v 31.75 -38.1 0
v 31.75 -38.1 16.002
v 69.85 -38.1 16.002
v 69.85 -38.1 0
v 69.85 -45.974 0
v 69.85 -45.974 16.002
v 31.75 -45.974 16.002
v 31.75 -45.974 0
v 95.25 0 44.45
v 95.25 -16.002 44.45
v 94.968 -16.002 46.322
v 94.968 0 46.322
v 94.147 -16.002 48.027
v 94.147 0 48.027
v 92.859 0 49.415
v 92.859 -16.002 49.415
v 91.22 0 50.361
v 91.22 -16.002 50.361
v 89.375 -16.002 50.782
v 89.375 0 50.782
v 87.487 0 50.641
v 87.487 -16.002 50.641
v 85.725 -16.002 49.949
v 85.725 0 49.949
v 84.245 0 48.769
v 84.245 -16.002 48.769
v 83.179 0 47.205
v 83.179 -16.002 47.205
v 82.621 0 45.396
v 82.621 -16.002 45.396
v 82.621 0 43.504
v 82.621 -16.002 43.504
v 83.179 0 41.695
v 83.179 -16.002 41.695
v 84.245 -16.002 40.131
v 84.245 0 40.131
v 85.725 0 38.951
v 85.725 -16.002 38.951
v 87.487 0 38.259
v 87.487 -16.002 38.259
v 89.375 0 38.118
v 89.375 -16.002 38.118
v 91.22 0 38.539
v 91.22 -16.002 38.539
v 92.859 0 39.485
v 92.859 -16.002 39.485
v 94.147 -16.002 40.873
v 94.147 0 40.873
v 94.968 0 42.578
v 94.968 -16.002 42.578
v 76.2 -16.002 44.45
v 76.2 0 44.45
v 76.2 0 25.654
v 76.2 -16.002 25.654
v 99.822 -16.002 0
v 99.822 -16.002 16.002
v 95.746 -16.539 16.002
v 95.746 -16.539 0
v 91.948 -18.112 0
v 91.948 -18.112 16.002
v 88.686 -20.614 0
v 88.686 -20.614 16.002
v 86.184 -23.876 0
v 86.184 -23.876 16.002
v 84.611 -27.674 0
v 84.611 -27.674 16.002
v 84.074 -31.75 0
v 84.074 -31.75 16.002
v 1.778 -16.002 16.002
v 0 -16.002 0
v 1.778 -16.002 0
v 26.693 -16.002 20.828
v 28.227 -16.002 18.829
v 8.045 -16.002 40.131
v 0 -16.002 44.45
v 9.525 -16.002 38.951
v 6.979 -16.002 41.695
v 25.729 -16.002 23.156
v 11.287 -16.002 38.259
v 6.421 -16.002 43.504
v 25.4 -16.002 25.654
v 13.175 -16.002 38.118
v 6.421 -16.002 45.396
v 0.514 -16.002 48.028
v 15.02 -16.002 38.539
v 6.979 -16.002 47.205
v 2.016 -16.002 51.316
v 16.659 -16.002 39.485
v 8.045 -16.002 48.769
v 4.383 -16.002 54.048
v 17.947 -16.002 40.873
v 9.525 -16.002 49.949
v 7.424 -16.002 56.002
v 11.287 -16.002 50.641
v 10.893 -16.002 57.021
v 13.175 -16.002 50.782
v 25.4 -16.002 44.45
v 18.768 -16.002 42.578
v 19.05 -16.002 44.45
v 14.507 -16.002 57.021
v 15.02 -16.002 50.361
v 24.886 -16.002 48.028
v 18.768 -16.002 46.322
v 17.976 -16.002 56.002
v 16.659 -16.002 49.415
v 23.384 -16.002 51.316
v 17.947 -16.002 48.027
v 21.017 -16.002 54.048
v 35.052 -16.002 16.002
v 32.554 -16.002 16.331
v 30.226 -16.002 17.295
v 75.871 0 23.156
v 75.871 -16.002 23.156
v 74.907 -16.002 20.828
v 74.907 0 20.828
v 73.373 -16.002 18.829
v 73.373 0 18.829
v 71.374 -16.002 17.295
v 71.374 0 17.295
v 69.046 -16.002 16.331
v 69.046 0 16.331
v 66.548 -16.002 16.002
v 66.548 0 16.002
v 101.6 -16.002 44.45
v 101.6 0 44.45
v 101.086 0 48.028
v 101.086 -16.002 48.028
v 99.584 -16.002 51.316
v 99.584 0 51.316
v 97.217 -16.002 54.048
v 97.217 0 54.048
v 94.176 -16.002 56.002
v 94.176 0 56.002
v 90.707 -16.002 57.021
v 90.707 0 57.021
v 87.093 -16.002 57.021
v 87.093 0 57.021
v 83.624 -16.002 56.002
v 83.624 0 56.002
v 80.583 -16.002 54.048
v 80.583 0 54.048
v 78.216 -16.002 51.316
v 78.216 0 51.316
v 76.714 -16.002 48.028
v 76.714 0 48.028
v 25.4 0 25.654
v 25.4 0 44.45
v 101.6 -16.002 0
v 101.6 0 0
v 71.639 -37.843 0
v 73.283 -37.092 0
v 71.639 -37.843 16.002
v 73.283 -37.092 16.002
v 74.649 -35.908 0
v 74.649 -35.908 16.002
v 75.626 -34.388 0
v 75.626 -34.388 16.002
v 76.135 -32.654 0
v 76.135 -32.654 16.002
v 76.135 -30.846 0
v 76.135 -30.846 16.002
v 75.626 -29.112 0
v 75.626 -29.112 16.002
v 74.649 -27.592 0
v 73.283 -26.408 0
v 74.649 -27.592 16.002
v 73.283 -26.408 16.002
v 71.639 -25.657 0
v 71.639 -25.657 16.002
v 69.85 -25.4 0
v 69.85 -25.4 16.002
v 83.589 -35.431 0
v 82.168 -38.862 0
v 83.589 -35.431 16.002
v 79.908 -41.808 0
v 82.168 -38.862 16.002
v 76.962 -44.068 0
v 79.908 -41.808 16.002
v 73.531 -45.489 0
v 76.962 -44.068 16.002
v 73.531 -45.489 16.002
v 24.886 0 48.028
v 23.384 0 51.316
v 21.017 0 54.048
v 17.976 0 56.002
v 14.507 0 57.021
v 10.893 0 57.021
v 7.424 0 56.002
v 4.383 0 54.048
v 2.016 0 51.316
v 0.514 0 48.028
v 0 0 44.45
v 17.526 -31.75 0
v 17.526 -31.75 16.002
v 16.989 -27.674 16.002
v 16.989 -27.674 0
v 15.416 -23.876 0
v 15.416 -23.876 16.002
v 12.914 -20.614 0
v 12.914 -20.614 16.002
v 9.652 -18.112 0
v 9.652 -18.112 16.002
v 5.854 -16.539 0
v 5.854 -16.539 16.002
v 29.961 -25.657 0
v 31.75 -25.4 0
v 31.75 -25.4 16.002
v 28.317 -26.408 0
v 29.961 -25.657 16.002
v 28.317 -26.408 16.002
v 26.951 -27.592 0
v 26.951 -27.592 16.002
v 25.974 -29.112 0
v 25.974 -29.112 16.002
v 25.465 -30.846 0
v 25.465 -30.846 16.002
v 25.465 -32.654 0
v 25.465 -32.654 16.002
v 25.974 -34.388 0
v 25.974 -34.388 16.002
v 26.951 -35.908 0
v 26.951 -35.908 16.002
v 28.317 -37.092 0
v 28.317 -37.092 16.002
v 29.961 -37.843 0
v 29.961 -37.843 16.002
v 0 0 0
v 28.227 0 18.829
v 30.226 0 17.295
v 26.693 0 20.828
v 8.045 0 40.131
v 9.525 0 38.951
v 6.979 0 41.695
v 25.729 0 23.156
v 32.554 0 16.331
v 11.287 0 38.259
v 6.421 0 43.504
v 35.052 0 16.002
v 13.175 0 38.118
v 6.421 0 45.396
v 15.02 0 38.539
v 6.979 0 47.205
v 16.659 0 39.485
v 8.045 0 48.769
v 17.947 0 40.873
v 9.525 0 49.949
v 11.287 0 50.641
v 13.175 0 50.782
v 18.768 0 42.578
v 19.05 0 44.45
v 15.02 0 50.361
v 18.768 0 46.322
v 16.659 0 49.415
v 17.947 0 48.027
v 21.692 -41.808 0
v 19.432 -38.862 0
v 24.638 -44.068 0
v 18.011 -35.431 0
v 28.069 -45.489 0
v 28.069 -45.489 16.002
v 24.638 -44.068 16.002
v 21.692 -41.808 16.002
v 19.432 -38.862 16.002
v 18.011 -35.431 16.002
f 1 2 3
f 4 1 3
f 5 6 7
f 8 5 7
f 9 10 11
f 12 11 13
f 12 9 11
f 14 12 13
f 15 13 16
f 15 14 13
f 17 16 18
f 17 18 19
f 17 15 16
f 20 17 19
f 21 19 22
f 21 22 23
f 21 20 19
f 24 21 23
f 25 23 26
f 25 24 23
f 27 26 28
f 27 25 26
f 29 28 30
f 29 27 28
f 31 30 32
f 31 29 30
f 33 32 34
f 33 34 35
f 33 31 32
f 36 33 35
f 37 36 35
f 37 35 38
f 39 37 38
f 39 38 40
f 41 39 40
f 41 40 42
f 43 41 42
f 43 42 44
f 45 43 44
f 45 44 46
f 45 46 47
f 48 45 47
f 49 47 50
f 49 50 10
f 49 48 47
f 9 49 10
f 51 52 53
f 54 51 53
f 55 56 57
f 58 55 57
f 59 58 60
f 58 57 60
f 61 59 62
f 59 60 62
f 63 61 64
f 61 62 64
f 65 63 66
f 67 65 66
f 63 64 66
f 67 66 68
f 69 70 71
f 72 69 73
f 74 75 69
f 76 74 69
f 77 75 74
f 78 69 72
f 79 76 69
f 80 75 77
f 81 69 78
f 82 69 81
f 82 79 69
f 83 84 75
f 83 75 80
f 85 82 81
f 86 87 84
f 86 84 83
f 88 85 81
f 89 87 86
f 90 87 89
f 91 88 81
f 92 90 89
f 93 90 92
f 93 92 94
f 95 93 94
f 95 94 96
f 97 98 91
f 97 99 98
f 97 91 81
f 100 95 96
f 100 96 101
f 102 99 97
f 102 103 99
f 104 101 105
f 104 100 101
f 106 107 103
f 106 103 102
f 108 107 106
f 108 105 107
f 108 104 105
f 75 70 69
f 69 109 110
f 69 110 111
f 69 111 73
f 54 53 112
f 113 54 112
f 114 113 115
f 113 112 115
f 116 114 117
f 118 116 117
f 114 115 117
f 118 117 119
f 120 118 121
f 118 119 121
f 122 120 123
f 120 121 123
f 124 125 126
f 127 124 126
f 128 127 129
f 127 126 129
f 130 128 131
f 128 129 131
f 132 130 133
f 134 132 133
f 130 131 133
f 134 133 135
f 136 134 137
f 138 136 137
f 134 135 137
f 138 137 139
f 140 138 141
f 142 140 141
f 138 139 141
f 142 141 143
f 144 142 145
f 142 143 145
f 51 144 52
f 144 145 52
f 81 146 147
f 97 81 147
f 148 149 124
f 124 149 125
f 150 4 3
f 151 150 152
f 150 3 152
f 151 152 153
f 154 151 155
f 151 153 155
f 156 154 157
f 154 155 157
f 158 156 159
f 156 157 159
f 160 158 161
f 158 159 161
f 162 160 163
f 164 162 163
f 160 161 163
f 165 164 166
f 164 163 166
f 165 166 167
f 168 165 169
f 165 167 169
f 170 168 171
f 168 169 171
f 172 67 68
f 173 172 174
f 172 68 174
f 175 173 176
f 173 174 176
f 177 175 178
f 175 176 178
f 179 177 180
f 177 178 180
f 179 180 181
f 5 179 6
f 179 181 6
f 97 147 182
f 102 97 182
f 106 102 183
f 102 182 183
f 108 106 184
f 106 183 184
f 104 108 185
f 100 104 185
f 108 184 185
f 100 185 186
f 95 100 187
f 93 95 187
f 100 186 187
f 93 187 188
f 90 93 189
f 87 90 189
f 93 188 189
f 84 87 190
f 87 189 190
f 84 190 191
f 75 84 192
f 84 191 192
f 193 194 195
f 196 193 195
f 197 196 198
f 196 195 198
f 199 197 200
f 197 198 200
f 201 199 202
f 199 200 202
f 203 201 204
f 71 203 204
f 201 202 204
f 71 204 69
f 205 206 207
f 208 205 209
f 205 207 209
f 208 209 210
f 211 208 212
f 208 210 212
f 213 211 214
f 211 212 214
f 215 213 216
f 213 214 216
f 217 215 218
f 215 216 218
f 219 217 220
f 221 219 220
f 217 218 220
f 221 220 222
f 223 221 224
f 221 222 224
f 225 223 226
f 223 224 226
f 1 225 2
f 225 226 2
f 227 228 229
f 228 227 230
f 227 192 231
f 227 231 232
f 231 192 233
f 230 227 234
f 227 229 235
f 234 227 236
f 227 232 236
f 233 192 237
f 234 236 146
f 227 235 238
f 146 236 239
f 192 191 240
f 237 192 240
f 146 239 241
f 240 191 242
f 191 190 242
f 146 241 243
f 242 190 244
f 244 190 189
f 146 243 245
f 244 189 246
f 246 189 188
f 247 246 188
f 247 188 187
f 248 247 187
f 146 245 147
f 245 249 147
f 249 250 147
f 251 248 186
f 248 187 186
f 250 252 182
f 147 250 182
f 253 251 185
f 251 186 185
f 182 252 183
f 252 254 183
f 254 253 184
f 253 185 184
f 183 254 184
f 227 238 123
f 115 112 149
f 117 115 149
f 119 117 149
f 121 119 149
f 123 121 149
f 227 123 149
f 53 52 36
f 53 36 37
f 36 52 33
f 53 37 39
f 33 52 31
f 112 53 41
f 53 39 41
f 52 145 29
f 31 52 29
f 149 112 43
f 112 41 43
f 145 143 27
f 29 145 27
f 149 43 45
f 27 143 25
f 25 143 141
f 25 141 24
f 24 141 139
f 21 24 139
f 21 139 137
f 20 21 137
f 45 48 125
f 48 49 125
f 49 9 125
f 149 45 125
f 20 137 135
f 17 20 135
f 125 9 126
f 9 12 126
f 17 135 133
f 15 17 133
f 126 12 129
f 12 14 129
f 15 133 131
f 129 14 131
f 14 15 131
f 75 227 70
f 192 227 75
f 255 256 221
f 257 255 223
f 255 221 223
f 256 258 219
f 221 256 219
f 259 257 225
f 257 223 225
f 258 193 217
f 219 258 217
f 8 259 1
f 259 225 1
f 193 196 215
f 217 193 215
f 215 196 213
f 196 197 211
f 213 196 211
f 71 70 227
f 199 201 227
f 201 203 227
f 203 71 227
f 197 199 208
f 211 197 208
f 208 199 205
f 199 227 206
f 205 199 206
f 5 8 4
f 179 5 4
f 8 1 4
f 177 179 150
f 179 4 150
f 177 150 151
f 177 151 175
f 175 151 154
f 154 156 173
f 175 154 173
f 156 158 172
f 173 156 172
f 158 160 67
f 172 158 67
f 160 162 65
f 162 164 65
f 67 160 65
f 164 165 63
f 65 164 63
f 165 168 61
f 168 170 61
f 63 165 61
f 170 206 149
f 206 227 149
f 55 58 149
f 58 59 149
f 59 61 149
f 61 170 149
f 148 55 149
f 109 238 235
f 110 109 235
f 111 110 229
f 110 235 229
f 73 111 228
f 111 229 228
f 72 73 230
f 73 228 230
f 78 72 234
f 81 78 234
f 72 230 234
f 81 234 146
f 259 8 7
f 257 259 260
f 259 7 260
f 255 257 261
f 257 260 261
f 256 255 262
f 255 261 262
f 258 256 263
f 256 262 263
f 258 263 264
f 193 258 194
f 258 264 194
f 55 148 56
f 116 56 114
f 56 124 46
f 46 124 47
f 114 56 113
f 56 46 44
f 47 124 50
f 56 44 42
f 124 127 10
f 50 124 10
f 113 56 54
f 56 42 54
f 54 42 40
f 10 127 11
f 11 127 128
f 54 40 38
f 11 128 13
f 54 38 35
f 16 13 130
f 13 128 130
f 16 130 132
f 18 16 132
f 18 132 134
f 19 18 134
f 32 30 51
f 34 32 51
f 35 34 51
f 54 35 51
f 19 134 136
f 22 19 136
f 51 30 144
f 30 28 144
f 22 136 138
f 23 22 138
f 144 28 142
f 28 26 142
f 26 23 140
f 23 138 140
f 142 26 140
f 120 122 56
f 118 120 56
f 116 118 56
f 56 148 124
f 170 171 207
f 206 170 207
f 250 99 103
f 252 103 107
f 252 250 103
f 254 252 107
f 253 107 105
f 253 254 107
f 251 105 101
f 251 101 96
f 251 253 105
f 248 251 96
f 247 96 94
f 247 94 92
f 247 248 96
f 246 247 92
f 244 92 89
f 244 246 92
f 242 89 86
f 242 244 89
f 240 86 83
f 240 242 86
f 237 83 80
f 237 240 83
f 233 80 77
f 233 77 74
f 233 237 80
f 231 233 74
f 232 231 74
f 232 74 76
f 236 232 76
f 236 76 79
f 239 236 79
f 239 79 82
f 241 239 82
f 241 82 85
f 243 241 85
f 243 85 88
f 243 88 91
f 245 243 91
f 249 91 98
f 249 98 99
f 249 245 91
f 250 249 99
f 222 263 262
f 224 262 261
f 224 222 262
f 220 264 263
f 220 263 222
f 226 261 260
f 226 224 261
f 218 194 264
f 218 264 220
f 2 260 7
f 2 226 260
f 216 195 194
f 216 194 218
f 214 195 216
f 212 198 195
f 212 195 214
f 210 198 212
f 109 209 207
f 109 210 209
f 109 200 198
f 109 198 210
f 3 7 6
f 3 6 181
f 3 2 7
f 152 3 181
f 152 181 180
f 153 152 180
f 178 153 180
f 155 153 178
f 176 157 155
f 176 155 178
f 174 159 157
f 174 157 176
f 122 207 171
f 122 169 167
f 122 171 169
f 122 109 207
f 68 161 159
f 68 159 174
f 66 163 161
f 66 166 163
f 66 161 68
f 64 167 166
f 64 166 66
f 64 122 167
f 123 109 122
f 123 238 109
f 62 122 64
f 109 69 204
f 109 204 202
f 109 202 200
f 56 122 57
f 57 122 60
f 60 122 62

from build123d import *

# Parameters (mm, degrees)
F0_R     = 6.35
F1_DEPTH = 16.002
F2_W     = 101.6
F2_H     = 16.002
F3_DEPTH = 50.8
F5_DEPTH = 16.003


with BuildPart() as f1:
    # F0 (on Front) → F1 (new body)
    with BuildSketch(Plane.XZ):
        with BuildLine():
            Line((101.6, 0), (101.6, 44.45))
            ThreePointArc((101.6, 44.45), (88.9, 57.15), (76.2, 44.45))
            Line((76.2, 44.45), (76.2, 25.654))
            ThreePointArc((76.2, 25.654), (73.372995, 18.829005), (66.548, 16.002))
            Line((66.548, 16.002), (35.052, 16.002))
            ThreePointArc((35.052, 16.002), (28.227005, 18.829005), (25.4, 25.654))
            Line((25.4, 25.654), (25.4, 44.45))
            ThreePointArc((25.4, 44.45), (12.7, 57.15), (0, 44.45))
            Line((0, 44.45), (0, 0))
            Line((0, 0), (101.6, 0))
        make_face()
        with Locations((12.7, 44.45)):
            Circle(F0_R, mode=Mode.SUBTRACT)
        with Locations((88.9, 44.45)):
            Circle(F0_R, mode=Mode.SUBTRACT)
    extrude(amount=F1_DEPTH)

    # F2 (on face) → F3 (join)
    with BuildSketch(Plane.XZ.offset(16.002)):
        with Locations((50.8, 8.001)):
            Rectangle(F2_W, F2_H)
    extrude(amount=F3_DEPTH)

    # F4 (on face) → F5 (cut, through all)
    with BuildSketch(Plane.XY.offset(16.002)):
        with BuildLine():
            ThreePointArc((31.75, -45.974), (21.692113, -41.807887), (17.526, -31.75))
            ThreePointArc((17.526, -31.75), (12.913518, -20.614482), (1.778, -16.002))
            Line((1.778, -16.002), (0, -16.002))
            Line((0, -16.002), (0, -66.802))
            Line((0, -66.802), (101.6, -66.802))
            Line((101.6, -66.802), (101.6, -16.002))
            Line((101.6, -16.002), (99.822, -16.002))
            ThreePointArc((99.822, -16.002), (88.686482, -20.614482), (84.074, -31.75))
            ThreePointArc((84.074, -31.75), (79.907887, -41.807887), (69.85, -45.974))
            Line((69.85, -45.974), (31.75, -45.974))
        make_face()
        with BuildLine():
            Line((69.85, -25.4), (31.75, -25.4))
            ThreePointArc((31.75, -25.4), (25.4, -31.75), (31.75, -38.1))
            Line((31.75, -38.1), (69.85, -38.1))
            ThreePointArc((69.85, -38.1), (76.2, -31.75), (69.85, -25.4))
        make_face()
    extrude(amount=-F5_DEPTH, mode=Mode.SUBTRACT)


solid = f1.part
